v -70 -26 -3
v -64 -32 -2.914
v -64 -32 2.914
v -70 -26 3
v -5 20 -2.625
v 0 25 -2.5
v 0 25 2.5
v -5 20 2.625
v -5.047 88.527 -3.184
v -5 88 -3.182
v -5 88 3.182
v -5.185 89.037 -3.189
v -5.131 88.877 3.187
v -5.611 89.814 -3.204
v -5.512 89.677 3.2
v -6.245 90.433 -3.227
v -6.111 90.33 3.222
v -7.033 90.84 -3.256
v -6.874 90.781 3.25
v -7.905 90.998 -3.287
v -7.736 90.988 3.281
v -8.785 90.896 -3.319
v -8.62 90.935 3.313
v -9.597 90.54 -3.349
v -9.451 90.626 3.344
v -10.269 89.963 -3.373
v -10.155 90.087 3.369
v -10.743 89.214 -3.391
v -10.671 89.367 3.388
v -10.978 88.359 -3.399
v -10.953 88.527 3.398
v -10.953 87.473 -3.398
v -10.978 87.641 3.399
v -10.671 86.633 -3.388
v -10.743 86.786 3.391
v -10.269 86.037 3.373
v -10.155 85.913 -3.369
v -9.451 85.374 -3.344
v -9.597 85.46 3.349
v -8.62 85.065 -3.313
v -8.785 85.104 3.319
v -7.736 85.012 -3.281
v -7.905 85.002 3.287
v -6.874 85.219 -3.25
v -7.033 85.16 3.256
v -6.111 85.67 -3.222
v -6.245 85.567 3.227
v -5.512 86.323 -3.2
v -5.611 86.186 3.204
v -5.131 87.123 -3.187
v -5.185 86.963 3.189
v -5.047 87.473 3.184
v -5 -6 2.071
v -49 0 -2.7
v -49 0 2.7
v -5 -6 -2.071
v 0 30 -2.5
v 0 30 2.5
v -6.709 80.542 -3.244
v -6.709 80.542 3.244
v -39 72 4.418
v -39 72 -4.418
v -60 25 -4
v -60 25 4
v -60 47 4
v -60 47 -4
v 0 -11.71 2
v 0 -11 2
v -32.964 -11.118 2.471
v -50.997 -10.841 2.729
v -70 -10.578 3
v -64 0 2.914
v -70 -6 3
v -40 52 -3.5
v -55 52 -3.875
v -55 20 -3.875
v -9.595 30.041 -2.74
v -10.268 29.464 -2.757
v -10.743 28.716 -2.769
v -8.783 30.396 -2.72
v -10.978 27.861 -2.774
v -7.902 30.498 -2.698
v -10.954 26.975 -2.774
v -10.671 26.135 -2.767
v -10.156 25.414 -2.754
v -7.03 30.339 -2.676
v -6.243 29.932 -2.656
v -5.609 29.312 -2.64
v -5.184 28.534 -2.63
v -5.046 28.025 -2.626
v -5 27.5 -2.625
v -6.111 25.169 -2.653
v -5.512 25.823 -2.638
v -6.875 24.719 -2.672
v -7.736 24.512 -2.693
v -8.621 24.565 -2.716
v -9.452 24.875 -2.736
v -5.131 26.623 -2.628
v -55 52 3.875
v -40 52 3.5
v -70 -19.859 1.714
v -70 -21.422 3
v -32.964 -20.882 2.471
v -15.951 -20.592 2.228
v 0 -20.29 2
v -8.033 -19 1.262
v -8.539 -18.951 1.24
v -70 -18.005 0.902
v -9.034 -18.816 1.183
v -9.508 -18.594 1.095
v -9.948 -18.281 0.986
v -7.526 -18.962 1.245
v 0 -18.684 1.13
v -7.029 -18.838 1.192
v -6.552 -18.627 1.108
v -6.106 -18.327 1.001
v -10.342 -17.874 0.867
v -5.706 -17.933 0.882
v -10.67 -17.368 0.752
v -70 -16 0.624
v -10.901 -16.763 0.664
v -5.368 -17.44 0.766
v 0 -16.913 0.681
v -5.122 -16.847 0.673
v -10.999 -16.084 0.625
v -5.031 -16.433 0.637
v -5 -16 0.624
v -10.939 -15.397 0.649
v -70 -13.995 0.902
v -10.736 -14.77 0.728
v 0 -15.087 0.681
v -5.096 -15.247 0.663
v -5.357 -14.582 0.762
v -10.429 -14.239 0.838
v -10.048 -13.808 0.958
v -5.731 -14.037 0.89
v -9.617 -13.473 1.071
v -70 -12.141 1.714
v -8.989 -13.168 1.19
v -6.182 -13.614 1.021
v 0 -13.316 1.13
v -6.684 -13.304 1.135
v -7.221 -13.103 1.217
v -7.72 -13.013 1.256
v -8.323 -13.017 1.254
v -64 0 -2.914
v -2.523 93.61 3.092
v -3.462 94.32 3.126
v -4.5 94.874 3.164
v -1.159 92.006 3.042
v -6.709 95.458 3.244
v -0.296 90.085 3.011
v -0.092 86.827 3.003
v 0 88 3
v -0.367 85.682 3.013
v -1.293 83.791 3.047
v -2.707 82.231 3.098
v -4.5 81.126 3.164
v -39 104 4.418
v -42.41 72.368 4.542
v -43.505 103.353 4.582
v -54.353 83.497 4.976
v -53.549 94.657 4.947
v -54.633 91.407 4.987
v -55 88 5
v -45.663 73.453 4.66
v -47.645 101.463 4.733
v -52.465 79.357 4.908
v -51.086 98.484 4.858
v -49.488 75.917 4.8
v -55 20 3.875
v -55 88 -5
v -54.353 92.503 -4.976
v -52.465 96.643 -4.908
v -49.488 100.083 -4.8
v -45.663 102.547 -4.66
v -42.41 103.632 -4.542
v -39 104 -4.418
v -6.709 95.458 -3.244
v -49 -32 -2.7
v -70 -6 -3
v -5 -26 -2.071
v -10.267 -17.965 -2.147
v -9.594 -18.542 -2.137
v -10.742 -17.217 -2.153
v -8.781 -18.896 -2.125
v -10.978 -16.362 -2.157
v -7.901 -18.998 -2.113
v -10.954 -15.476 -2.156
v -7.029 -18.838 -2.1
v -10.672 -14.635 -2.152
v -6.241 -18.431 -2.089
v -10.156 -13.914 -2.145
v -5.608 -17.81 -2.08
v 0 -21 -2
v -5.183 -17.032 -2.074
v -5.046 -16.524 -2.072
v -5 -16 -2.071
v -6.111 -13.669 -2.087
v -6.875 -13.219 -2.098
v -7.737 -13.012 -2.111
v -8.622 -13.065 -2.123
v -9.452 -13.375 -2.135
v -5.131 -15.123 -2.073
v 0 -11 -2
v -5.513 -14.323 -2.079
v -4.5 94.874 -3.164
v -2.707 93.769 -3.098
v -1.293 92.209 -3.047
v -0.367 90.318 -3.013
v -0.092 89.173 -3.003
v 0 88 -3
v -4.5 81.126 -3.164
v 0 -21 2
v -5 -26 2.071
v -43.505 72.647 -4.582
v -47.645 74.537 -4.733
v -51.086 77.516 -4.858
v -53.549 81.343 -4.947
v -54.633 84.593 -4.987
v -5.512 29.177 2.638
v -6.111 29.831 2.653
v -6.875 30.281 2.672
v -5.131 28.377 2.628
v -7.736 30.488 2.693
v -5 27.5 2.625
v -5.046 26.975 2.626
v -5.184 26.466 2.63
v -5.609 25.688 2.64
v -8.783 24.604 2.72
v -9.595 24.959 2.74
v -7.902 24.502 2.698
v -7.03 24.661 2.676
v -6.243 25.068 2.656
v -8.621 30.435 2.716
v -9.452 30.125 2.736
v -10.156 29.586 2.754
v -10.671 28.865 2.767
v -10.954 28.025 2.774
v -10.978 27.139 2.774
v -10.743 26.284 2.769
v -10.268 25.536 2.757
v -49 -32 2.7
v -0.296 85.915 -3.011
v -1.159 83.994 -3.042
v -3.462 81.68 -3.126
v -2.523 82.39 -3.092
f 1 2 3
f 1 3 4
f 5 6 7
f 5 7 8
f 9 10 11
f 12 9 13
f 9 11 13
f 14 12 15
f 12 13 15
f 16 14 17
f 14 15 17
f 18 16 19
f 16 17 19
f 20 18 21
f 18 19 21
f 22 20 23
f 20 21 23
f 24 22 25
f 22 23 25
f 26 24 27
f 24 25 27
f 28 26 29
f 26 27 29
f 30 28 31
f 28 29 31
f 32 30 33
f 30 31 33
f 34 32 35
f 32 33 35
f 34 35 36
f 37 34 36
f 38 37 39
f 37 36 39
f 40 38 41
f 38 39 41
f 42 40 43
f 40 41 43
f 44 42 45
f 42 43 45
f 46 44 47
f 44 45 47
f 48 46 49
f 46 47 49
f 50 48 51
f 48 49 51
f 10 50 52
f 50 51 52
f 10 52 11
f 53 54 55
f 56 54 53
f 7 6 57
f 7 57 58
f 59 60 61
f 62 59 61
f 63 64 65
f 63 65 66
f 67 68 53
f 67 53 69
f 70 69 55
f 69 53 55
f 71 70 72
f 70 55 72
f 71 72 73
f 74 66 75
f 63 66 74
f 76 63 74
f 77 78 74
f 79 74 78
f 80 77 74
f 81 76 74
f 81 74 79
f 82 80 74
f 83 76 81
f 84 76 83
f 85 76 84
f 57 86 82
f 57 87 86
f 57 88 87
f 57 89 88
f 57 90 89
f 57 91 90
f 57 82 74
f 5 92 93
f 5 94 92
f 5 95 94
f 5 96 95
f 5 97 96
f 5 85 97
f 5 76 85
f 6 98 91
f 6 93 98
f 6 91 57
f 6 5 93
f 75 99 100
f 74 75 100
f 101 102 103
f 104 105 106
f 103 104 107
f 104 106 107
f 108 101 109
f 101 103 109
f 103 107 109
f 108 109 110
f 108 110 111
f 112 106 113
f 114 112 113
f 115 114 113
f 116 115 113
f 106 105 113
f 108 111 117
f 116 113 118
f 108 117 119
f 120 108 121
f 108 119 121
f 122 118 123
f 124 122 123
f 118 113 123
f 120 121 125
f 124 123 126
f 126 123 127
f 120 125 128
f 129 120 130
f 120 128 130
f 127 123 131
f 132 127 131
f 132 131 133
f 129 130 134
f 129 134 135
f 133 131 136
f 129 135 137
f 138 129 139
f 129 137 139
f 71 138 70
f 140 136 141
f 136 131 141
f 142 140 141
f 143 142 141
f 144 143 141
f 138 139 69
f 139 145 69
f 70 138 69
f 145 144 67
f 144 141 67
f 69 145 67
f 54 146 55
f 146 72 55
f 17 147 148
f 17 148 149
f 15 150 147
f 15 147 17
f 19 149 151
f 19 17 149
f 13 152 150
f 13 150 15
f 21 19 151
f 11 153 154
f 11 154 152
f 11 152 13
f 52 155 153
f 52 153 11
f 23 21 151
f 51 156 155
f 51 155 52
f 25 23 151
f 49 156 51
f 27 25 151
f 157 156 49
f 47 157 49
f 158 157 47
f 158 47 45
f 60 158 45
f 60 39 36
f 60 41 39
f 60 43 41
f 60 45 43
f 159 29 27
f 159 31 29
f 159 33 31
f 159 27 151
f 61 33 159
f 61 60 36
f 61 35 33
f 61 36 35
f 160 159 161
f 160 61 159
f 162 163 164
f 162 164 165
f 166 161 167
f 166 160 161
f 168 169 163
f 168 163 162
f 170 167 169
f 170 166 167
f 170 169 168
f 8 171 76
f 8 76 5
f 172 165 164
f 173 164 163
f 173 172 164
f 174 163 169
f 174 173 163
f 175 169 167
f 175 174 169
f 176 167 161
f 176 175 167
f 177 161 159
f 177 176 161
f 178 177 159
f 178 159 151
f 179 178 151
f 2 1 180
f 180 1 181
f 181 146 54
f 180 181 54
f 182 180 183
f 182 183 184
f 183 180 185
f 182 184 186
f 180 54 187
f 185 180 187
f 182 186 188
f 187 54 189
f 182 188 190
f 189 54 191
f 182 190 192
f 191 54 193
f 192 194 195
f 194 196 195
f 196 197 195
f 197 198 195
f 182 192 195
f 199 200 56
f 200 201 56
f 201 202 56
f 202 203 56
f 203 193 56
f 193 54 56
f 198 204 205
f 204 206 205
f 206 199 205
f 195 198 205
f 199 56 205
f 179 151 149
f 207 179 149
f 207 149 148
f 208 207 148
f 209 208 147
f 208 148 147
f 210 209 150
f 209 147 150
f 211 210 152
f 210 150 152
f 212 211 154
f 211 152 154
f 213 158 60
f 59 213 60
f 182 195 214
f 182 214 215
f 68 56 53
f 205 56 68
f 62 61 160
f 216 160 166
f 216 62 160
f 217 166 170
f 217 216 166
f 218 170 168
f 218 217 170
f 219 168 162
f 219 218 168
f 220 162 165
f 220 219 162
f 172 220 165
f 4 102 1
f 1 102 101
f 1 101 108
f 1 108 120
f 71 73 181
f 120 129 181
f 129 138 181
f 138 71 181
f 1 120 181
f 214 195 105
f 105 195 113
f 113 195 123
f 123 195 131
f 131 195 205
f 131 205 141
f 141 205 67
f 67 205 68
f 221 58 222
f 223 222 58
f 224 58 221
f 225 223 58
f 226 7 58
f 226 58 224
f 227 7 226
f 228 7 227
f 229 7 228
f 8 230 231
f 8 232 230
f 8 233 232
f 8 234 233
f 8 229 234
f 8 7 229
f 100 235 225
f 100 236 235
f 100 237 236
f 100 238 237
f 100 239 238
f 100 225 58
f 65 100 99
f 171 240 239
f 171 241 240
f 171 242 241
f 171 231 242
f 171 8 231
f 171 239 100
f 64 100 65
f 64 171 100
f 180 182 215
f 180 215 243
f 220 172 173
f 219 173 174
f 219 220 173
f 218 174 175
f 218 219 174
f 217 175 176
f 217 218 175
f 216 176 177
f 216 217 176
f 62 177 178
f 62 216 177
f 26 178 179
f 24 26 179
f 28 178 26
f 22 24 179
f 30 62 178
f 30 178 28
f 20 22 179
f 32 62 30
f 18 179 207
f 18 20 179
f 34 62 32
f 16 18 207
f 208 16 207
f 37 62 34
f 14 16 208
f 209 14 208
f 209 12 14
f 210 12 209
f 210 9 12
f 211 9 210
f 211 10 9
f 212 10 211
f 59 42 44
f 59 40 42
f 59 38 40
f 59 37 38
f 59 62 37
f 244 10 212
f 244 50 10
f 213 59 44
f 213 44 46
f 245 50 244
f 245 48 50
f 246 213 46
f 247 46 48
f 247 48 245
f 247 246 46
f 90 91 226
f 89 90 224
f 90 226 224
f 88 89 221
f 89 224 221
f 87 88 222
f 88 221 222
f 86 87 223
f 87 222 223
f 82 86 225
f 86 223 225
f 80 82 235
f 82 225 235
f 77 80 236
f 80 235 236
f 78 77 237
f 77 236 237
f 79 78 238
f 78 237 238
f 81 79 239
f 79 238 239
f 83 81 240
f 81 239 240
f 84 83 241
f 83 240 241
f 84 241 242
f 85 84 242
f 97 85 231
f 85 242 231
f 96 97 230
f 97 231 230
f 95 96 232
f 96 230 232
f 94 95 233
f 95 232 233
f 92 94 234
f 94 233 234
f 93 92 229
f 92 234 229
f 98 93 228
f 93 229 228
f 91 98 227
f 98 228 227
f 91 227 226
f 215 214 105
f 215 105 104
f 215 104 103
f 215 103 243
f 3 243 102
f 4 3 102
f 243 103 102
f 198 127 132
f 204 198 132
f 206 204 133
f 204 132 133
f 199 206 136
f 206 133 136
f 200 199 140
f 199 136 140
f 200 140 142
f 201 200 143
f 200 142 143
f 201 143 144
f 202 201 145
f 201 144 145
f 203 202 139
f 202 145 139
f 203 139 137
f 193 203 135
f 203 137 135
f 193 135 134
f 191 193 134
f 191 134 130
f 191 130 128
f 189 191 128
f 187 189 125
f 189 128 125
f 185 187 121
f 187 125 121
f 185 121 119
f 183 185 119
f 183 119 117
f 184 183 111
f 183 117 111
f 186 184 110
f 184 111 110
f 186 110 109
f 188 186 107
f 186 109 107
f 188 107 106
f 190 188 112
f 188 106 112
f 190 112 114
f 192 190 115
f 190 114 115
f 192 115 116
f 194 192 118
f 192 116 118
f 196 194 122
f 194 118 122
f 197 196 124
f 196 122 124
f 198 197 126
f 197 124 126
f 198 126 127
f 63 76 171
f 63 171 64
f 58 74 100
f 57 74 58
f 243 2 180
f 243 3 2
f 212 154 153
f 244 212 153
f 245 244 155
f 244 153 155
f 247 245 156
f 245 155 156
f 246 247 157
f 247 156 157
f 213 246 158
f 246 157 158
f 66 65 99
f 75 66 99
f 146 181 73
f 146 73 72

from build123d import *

# Parameters (mm, degrees)
F1_DEPTH  = 32
F2_R      = 3
F3_DEPTH  = 12.5
F4_R      = 7.3760593874
F5_DEPTH  = 72.3
F8_DEPTH  = 32
F9_R      = 3
F10_DEPTH = 12.5
F13_DEPTH = 32
F15_DEPTH = 40
F16_R     = 3
F17_DEPTH = 12.5


with BuildPart() as f1:
    # F0 (on Front) → F1 (new body)
    with BuildSketch(Plane.XZ):
        Polygon((0, -2), (0, 2), (-70, 3), (-70, -3), align=None)
    extrude(amount=F1_DEPTH)

    # F2 (on Top) → F3 (cut, symmetric)
    with BuildSketch(Plane.XY):
        Polygon((-70, -32), (-64, -32), (-70, -26), align=None)
        Polygon((-5, -26), (-49, -32), (0, -32), (0, -21), align=None)
        Polygon((-49, 0), (-5, -6), (0, -11), (0, 0), align=None)
        Polygon((-64, 0), (-70, 0), (-70, -6), align=None)
        with Locations((-8, -16)):
            Circle(F2_R)
    extrude(amount=F3_DEPTH, both=True, mode=Mode.SUBTRACT)

    # F4 (on Right) → F5 (cut)
    with BuildSketch(Plane.YZ):
        with Locations((-16, 8.0004718099)):
            Circle(F4_R)
    extrude(amount=-F5_DEPTH, mode=Mode.SUBTRACT)


with BuildPart() as f8:
    # F7 (on offset) → F8 (new body)
    with BuildSketch(Plane.XZ.offset(-20)):
        Polygon((0, 2.5), (-60, 4), (-60, -4), (0, -2.5), align=None)
    extrude(amount=-F8_DEPTH)

    # F9 (on Top) → F10 (cut, symmetric)
    with BuildSketch(Plane.XY):
        Polygon((0, 20), (0, 25), (-5, 20), align=None)
        Polygon((-60, 20), (-55, 20), (-60, 25), align=None)
        Polygon((-60, 52), (-60, 47), (-55, 52), align=None)
        Polygon((-40, 52), (0, 30), (0, 52), align=None)
        with Locations((-8, 27.5)):
            Circle(F9_R)
    extrude(amount=F10_DEPTH, both=True, mode=Mode.SUBTRACT)


with BuildPart() as f13:
    # F12 (on offset) → F13 (new body)
    with BuildSketch(Plane.XZ.offset(-72)):
        Polygon((-55, -5), (0, -3), (0, 0), (0, 3), (-55, 5), align=None)
    extrude(amount=-F13_DEPTH)

    # F14 (on Top) → F15 (cut, symmetric)
    with BuildSketch(Plane.XY):
        with BuildLine():
            Line((0, 72), (0, 88))
            ThreePointArc((0, 88), (-1.225049801, 83.8920808187), (-4.5, 81.1261364576))
            Line((-4.5, 81.1261364576), (-6.7088137589, 80.5418484641))
            Line((-6.7088137589, 80.5418484641), (-39, 72))
            Line((-39, 72), (0, 72))
        make_face()
        with BuildLine():
            Line((-6.7088137589, 95.4581515359), (-4.5, 94.8738635424))
            ThreePointArc((-4.5, 94.8738635424), (-1.225049801, 92.1079191813), (0, 88))
            Line((0, 88), (0, 104))
            Line((0, 104), (-39, 104))
            Line((-39, 104), (-6.7088137589, 95.4581515359))
        make_face()
    extrude(amount=F15_DEPTH, both=True, mode=Mode.SUBTRACT)

    # F16 (on Top) → F17 (cut, symmetric)
    with BuildSketch(Plane.XY):
        with BuildLine():
            ThreePointArc((-39, 72), (-50.313708499, 76.686291501), (-55, 88))
            Line((-55, 88), (-55, 72))
            Line((-55, 72), (-39, 72))
        make_face()
        with BuildLine():
            ThreePointArc((-55, 88), (-50.313708499, 99.313708499), (-39, 104))
            Line((-39, 104), (-55, 104))
            Line((-55, 104), (-55, 88))
        make_face()
        with Locations((-8, 88)):
            Circle(F16_R)
    extrude(amount=F17_DEPTH, both=True, mode=Mode.SUBTRACT)


solid = Compound([f1.part, f8.part, f13.part])
